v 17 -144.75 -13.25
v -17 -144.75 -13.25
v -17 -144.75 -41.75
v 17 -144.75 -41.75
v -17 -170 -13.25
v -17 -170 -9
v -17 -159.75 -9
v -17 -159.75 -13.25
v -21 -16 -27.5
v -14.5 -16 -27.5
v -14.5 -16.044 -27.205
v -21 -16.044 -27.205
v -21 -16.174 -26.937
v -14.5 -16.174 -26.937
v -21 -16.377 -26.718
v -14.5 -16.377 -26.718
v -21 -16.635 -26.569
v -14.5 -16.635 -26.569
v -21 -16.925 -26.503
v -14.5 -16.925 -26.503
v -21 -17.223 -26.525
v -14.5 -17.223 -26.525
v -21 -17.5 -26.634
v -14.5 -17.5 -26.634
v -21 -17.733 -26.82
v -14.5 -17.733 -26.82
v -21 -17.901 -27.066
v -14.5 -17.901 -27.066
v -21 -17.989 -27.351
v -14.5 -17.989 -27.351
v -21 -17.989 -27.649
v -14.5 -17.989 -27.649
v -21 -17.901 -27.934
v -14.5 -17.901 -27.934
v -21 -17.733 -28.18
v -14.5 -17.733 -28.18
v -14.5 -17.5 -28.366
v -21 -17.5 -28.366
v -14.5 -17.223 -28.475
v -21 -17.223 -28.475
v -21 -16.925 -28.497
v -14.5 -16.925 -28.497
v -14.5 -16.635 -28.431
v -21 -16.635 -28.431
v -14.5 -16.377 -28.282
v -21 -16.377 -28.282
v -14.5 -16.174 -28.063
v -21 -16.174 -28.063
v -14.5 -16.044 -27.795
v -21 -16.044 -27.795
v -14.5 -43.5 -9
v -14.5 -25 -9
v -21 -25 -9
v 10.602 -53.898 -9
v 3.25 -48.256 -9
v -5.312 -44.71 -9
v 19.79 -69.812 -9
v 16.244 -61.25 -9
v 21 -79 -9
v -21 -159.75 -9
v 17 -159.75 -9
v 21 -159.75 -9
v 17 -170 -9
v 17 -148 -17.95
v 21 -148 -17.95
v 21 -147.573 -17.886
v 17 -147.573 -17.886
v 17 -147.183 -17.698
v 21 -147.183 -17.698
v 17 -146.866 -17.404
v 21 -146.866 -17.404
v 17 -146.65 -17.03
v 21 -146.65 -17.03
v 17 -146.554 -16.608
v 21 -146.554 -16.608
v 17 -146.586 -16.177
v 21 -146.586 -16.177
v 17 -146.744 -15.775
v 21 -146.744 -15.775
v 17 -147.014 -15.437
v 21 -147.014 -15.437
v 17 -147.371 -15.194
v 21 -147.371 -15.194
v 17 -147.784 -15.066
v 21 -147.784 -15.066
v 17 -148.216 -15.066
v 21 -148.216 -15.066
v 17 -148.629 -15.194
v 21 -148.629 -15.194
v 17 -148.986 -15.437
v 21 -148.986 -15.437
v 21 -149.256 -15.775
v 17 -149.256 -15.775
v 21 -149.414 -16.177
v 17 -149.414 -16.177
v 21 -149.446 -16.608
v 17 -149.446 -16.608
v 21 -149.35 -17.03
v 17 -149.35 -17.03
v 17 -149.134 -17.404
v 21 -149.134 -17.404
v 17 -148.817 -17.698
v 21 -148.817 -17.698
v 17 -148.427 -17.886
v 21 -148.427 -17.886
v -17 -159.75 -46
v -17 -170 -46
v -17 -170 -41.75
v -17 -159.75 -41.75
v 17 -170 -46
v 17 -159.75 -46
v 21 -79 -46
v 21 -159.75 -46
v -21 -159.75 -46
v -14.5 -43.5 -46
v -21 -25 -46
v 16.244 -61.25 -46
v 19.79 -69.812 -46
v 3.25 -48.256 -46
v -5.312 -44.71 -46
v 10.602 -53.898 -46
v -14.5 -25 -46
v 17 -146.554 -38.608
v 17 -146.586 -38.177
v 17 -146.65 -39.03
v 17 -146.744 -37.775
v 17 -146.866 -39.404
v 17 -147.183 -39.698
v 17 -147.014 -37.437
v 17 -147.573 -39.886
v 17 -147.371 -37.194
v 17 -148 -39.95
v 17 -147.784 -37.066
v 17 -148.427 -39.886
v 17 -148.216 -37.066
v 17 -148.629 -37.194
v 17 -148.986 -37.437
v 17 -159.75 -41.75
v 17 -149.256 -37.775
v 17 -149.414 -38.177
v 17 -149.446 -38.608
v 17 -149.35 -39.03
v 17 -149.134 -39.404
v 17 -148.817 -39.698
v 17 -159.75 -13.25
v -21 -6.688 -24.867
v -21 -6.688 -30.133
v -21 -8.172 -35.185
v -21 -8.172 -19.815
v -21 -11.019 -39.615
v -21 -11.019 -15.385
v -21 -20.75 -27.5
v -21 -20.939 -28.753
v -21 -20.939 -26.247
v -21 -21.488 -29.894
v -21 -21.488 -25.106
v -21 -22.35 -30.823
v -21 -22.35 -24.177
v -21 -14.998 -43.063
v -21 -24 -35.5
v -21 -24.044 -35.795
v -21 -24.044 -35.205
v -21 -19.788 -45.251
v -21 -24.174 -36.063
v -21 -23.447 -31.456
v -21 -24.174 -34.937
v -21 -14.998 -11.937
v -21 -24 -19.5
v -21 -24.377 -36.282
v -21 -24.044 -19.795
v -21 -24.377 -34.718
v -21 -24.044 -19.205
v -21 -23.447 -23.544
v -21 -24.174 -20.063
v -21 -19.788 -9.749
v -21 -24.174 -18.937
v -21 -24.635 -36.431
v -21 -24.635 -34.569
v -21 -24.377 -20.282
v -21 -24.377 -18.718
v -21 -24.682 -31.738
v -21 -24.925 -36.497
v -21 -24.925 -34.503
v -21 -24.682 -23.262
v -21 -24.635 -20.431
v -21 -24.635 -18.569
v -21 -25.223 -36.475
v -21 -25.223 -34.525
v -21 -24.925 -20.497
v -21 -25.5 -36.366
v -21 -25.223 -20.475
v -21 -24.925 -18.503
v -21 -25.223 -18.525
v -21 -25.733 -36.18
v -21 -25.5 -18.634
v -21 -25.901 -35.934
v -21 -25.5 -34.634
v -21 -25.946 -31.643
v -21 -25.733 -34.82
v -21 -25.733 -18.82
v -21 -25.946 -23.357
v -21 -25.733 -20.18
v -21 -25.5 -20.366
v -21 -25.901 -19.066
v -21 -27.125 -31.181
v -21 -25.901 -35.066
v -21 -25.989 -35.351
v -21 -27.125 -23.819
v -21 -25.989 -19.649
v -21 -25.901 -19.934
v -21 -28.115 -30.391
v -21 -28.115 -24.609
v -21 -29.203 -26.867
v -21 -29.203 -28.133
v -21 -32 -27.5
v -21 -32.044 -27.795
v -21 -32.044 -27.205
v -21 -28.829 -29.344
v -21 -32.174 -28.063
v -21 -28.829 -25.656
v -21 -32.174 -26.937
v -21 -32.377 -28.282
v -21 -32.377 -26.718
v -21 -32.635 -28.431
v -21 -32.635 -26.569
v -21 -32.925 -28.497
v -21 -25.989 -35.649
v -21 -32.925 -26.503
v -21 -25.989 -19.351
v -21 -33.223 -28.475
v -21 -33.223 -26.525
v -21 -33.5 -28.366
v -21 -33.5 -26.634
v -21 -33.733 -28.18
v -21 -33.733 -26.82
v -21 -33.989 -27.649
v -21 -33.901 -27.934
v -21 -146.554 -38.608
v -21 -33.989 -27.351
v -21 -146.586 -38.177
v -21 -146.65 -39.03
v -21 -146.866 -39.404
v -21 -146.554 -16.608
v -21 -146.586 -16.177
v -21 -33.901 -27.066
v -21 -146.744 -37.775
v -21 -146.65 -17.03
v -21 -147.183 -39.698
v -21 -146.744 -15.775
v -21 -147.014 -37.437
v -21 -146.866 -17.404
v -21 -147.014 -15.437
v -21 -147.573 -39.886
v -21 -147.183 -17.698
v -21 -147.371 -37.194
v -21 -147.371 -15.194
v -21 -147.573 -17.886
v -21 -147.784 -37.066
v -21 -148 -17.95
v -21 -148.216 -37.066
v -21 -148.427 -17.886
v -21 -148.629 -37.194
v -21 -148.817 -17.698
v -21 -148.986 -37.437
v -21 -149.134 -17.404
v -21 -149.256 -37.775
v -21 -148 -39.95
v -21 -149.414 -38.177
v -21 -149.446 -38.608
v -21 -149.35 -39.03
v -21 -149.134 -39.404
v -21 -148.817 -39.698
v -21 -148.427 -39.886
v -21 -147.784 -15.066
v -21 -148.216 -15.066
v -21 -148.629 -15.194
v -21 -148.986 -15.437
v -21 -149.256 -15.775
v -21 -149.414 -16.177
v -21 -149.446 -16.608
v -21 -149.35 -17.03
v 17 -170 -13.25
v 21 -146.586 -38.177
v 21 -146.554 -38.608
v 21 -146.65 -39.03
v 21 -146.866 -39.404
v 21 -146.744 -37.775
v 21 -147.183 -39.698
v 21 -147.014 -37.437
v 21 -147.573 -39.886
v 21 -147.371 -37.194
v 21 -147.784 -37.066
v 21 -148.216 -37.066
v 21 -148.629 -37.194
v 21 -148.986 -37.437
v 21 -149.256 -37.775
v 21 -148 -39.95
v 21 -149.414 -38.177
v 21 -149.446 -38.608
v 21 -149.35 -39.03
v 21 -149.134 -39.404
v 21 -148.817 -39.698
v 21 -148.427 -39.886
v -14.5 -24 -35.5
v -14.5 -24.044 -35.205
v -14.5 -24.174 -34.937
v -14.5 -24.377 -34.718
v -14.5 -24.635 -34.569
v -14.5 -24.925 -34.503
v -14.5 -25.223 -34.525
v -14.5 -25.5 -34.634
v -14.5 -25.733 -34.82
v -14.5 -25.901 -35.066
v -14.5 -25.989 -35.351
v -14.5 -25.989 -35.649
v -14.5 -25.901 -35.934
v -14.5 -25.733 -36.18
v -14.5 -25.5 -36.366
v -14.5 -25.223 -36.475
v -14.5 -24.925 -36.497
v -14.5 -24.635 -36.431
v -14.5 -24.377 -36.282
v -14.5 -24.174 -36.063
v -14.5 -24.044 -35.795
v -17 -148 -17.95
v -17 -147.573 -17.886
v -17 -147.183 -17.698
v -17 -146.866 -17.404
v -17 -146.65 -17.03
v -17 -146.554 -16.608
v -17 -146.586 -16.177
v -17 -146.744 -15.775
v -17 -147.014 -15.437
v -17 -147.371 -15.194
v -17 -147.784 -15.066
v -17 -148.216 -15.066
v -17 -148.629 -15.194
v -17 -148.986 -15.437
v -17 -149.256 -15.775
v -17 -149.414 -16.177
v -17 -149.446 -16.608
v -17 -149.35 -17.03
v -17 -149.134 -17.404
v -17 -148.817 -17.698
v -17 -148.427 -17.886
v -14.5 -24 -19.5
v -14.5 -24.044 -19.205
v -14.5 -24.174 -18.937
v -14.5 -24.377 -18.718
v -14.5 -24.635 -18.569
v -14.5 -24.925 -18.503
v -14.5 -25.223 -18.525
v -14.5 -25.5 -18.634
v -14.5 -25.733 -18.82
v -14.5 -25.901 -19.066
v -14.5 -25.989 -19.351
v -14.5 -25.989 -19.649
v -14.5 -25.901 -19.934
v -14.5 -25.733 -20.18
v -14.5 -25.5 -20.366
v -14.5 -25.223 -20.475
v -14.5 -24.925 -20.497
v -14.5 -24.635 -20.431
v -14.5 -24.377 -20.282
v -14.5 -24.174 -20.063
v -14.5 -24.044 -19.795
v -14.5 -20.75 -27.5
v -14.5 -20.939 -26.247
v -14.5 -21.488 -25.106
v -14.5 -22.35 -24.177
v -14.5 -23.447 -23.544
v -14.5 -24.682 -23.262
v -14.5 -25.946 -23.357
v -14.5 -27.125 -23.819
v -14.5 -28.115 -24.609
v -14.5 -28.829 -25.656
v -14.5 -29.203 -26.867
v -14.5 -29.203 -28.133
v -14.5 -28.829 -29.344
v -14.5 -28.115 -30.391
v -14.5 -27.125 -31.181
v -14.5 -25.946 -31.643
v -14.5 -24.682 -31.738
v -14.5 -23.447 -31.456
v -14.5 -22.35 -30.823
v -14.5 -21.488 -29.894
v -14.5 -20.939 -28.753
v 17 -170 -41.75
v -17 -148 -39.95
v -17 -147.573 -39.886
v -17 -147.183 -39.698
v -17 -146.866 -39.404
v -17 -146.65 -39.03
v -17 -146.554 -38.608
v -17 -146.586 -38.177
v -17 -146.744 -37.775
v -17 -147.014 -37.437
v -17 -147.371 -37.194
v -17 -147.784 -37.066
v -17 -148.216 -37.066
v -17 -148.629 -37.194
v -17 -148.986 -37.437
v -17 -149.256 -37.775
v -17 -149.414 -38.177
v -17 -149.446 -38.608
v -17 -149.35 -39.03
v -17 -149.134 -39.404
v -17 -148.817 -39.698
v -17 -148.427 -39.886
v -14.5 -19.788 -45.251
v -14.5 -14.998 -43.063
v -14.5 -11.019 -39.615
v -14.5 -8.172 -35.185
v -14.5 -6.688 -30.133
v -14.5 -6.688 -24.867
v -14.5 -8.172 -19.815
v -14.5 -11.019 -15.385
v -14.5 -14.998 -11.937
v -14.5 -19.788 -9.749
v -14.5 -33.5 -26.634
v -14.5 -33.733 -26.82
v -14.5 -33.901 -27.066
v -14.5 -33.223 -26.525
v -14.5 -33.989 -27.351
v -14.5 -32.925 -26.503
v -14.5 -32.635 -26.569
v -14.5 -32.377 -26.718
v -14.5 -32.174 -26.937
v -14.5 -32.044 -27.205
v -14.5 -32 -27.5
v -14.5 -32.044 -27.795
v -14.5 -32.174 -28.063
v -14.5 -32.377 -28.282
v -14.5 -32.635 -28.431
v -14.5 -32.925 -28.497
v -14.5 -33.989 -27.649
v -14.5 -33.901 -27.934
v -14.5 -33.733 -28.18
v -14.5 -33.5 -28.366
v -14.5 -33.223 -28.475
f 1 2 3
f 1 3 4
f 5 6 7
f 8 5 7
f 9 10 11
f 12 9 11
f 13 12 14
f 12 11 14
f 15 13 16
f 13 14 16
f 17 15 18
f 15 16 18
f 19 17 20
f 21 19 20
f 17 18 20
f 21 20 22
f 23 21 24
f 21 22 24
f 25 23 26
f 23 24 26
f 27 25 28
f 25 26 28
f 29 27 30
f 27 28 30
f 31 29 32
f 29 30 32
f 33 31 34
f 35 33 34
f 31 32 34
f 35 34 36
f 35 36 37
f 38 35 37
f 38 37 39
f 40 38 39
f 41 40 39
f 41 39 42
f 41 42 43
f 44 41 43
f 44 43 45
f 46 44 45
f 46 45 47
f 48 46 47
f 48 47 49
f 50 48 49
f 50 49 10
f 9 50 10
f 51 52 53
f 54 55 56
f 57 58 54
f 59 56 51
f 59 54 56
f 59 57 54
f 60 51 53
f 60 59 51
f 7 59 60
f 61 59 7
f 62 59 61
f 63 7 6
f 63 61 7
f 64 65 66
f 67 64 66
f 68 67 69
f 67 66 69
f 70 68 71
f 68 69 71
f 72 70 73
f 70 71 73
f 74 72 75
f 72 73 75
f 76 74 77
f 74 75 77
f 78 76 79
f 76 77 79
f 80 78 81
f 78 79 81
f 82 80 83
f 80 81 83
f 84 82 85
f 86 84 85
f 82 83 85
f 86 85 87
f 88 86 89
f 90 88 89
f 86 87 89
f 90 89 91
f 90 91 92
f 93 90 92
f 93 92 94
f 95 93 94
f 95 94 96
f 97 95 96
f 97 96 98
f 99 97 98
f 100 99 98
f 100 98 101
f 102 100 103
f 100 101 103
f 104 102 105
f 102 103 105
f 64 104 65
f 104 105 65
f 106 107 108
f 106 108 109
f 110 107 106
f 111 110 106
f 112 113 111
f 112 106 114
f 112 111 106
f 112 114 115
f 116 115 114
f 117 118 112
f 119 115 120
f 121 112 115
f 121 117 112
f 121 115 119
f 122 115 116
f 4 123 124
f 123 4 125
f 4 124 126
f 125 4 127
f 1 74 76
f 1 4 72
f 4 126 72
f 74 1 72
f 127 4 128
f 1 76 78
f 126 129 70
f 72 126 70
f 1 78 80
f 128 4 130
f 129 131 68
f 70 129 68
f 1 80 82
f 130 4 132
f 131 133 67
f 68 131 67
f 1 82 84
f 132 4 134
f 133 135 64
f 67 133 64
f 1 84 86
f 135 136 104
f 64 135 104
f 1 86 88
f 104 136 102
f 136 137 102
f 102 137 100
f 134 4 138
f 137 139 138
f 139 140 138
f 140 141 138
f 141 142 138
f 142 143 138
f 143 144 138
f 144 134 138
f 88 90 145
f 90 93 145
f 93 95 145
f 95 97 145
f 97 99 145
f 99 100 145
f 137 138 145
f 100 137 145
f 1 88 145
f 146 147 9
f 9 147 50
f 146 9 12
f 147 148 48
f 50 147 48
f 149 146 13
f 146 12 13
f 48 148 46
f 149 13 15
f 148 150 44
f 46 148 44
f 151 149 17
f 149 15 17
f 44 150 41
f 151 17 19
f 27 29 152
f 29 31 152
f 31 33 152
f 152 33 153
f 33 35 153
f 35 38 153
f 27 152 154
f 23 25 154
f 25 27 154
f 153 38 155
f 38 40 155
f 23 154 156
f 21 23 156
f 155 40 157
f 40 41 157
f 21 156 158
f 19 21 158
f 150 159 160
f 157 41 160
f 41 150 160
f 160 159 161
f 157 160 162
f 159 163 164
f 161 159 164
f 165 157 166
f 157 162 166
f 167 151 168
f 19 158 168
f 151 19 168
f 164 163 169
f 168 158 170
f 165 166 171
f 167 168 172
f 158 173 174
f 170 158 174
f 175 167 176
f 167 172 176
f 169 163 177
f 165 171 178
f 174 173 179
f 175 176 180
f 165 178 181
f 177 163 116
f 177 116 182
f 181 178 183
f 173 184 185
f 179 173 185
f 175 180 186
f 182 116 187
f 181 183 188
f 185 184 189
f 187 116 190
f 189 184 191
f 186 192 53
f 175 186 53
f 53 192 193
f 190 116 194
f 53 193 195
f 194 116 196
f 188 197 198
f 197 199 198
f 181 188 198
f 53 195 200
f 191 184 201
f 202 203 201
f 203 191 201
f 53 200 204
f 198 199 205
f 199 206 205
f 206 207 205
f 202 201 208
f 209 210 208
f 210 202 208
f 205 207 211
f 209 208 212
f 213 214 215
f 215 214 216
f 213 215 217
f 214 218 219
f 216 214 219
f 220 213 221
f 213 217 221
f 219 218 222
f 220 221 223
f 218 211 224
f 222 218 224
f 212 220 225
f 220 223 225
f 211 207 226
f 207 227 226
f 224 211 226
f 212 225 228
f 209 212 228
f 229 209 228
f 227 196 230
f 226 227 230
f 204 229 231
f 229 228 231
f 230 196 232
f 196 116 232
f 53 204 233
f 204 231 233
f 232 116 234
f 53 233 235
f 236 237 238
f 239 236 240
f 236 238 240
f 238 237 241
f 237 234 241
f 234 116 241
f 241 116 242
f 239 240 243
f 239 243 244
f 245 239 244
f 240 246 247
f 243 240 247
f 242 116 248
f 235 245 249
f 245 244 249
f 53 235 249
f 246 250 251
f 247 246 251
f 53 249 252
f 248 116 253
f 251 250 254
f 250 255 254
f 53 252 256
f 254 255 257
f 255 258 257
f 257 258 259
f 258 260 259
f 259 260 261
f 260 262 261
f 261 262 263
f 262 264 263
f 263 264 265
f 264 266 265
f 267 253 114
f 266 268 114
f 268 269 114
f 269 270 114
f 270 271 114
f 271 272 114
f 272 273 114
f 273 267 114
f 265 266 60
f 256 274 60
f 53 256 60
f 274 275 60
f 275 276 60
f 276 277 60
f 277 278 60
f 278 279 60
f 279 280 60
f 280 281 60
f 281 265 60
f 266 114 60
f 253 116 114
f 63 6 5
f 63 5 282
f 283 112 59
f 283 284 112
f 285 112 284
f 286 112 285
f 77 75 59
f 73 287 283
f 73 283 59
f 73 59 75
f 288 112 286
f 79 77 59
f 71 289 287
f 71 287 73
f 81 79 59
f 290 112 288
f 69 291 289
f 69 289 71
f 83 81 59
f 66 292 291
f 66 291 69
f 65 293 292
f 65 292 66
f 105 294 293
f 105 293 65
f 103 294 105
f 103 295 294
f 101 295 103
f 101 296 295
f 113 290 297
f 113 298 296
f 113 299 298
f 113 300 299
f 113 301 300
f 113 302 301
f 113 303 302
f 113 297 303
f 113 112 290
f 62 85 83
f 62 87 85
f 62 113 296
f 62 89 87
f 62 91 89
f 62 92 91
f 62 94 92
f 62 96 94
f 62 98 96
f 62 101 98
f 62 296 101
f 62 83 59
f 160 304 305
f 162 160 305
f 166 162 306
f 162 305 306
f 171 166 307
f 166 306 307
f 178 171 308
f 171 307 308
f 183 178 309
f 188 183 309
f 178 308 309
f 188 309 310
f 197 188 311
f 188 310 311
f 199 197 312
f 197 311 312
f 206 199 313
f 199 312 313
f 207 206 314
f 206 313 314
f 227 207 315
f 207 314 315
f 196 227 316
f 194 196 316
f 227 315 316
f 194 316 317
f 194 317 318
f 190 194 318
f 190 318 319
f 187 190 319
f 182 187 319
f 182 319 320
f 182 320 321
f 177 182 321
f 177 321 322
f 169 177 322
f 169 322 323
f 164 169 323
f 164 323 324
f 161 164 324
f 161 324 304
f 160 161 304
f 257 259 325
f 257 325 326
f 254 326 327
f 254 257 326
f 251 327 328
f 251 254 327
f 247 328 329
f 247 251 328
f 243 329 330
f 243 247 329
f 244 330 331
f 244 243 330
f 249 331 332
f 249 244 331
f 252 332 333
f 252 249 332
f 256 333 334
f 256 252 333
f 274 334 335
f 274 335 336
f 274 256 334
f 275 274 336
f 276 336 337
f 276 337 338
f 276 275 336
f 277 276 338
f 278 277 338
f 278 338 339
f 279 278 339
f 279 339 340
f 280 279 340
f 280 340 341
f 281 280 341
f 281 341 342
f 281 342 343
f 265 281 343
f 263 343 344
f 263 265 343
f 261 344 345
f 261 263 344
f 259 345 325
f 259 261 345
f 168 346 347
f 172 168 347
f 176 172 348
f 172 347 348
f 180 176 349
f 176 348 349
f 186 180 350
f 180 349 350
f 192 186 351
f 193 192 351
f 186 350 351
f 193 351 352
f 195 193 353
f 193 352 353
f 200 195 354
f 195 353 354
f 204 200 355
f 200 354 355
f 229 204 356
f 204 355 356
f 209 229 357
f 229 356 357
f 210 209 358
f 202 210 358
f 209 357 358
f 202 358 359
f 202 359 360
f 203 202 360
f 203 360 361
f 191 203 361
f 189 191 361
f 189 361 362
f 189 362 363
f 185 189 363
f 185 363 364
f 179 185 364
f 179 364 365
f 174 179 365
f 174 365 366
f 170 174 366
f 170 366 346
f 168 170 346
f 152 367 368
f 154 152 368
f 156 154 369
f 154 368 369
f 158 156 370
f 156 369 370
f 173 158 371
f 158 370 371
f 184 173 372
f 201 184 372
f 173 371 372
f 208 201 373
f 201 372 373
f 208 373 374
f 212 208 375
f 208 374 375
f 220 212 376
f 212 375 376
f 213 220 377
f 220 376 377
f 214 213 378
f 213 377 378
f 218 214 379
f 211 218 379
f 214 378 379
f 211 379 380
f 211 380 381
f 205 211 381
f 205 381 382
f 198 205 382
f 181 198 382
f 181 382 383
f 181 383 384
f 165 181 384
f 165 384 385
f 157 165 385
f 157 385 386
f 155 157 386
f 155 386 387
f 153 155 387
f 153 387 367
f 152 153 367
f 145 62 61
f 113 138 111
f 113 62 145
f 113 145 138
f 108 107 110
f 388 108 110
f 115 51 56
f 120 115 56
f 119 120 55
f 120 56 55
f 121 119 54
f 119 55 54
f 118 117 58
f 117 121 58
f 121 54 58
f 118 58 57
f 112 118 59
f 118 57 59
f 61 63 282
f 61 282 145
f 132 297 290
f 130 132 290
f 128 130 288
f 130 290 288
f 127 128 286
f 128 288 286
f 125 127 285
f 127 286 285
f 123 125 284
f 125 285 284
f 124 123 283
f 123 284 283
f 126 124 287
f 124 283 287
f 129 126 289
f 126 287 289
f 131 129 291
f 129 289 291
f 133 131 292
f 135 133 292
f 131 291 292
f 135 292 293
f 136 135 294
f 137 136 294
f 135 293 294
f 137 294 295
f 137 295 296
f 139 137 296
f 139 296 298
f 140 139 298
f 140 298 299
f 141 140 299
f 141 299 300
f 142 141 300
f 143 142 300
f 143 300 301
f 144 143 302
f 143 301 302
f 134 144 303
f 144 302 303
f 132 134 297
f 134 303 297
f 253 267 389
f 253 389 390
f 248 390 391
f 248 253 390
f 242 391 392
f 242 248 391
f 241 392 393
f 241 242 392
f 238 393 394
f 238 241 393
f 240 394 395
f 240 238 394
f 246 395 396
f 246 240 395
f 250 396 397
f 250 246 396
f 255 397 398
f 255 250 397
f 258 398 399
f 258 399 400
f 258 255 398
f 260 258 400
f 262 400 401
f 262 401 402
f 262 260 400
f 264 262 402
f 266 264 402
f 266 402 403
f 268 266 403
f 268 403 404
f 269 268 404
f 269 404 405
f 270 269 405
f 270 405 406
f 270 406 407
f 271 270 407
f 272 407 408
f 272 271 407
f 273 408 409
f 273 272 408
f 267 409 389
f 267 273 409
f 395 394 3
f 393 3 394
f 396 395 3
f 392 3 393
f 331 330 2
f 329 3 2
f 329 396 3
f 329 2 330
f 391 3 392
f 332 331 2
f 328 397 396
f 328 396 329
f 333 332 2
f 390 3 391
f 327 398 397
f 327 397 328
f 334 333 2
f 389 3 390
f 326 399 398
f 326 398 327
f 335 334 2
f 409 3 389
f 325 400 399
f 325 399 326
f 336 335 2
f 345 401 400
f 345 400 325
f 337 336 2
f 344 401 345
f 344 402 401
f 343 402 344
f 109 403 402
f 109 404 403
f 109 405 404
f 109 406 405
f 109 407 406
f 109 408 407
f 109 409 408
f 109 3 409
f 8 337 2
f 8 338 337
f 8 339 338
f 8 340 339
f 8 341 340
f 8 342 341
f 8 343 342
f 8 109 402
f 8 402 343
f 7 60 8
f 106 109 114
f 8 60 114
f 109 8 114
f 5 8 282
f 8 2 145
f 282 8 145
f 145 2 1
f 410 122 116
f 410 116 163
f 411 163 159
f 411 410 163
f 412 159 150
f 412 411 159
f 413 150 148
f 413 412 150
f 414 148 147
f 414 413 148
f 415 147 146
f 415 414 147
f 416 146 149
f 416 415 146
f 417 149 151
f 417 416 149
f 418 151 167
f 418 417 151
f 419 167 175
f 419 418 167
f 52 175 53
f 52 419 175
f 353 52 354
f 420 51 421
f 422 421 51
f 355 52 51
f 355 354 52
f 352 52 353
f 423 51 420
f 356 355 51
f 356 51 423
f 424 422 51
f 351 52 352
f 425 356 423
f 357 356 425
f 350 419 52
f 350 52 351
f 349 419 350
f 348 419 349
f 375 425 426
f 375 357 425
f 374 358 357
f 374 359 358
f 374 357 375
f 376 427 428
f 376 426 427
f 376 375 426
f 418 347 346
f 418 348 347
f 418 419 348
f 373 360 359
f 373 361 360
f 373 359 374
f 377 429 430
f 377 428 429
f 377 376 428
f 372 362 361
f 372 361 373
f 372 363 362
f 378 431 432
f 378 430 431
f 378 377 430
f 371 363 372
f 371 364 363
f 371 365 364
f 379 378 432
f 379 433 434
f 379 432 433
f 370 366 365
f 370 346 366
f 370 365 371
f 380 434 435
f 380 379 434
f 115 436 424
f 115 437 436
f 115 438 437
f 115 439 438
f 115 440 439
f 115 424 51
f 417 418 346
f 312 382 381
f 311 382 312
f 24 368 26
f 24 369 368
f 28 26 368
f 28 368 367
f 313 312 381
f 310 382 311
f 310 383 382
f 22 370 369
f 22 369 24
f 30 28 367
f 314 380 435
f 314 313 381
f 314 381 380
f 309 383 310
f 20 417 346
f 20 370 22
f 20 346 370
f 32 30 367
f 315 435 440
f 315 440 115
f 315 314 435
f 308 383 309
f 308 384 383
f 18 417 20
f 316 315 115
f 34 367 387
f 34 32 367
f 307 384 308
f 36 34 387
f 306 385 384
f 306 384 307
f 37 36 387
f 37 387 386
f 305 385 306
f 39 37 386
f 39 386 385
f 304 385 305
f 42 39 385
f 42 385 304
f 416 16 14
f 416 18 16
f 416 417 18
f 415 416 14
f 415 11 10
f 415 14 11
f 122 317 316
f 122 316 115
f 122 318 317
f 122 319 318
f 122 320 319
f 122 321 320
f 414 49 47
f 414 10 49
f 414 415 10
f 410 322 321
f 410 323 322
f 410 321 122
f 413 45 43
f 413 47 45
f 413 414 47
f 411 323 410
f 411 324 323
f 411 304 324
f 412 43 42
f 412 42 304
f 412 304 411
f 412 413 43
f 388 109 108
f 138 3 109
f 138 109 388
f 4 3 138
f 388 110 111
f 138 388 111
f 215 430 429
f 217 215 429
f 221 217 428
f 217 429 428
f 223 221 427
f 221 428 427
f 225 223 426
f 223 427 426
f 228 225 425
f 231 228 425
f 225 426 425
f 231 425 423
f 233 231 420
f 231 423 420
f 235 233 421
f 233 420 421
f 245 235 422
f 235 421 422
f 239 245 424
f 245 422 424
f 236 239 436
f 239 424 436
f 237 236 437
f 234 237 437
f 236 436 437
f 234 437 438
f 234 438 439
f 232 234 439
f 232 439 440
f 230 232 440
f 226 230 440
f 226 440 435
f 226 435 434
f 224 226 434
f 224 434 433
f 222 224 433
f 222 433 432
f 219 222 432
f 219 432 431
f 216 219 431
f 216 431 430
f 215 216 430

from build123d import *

# Parameters (mm, degrees)
SKETCH1_W               = 50
SKETCH1_H               = 150
BOSS_EXTRUDE1_DEPTH     = 55
CUT_EXTRUDE1_DEPTH      = 168.406690428
CUT_EXTRUDE1_DEPTH_BACK = 45
SKETCH2_R               = 10.25
SKETCH7_R               = 1
SKETCH7_R_2             = 4.25
CUT_EXTRUDE3_DEPTH      = 10
SKETCH8_W               = 55
SKETCH8_H               = 55
SKETCH8_R               = 10.25
BOSS_EXTRUDE2_DEPTH     = 50
SKETCH10_W              = 8
SKETCH10_H              = 10.25
SKETCH10_W_2            = 17
SKETCH10_H_2            = 1
SKETCH10_W_3            = 34
SKETCH10_H_3            = 20
SKETCH10_H_4            = 5
CUT_EXTRUDE4_DEPTH      = 214.717102732
SKETCH11_W              = 34
SKETCH11_H              = 13.25
BOSS_EXTRUDE4_DEPTH     = 25
SKETCH13_W              = 55
SKETCH13_H              = 10
CUT_EXTRUDE5_DEPTH      = 8
SKETCH14_R              = 5.030159043
CUT_EXTRUDE6_DEPTH      = 8
SKETCH15_W              = 34
SKETCH15_H              = 0.25
BOSS_EXTRUDE5_DEPTH     = 13.25
CUT_EXTRUDE7_DEPTH      = 181.416185527
BOSS_EXTRUDE6_START     = 1.5
SKETCH19_R              = 10.25
SKETCH19_R_2            = 1
SKETCH19_R_3            = 4.25
BOSS_EXTRUDE6_DEPTH     = 1.5
CUT_EXTRUDE8_DEPTH      = 184.89467094
SKETCH21_R              = 5.030159043
SKETCH21_R_2            = 4.5
BOSS_EXTRUDE7_DEPTH     = 8
SKETCH24_W              = 4
SKETCH24_H              = 30
CUT_EXTRUDE10_DEPTH     = 181.416185527
SKETCH25_W              = 55
SKETCH25_H              = 86.25
CUT_EXTRUDE11_DEPTH     = 4
BOSS_EXTRUDE8_START     = 4
SKETCH26_R              = 1
SKETCH26_R_2            = 4.25
BOSS_EXTRUDE8_DEPTH     = 4
SKETCH27_W              = 4
SKETCH27_H              = 123.25
CUT_EXTRUDE12_DEPTH     = 181.416185527
CUT_EXTRUDE13_DEPTH     = 180.905530765
SKETCH29_W              = 42
SKETCH29_H              = 9
CUT_EXTRUDE15_DEPTH     = 174.776436838
SKETCH30_R              = 4.5
SKETCH30_R_2            = 1.45
BOSS_EXTRUDE9_DEPTH     = 4


with BuildPart() as part:
    # Sketch1 → Boss-Extrude1 (new body)
    with BuildSketch(Plane.XY):
        with Locations((0, -75)):
            Rectangle(SKETCH1_W, SKETCH1_H)
    extrude(amount=-BOSS_EXTRUDE1_DEPTH)

    # Sketch2 → Cut-Extrude1 (cut, two sides: drawn at the far end of the back side and taken through both)
    with BuildSketch(Plane(origin=(25, 0, 0), x_dir=(0, 0, -1), z_dir=(1, 0, 0)).offset(-CUT_EXTRUDE1_DEPTH_BACK)):
        with Locations(Location((27.5, -25, 0), (0, 0, 270))):
            Circle(SKETCH2_R)
    extrude(amount=CUT_EXTRUDE1_DEPTH + CUT_EXTRUDE1_DEPTH_BACK, mode=Mode.SUBTRACT)

    # Sketch7 → Cut-Extrude3 (cut)
    with BuildSketch(Plane(origin=(-20, 0, 0), x_dir=(0, 0, -1), z_dir=(1, 0, 0))):
        with Locations(Location((27.5, -17, 0), (0, 0, 90))):
            Circle(SKETCH7_R)
        with Locations(Location((35.5, -25, 0), (0, 0, 90))):
            Circle(SKETCH7_R)
        with Locations(Location((27.5, -33, 0), (0, 0, 90))):
            Circle(SKETCH7_R)
        with Locations(Location((19.5, -25, 0), (0, 0, 90))):
            Circle(SKETCH7_R)
        with Locations(Location((27.5, -25, 0), (0, 0, 90))):
            Circle(SKETCH7_R_2)
    extrude(amount=-CUT_EXTRUDE3_DEPTH, mode=Mode.SUBTRACT)

    # Sketch8 → Boss-Extrude2 (add)
    with BuildSketch(Plane(origin=(25, 0, 0), x_dir=(0, 0, -1), z_dir=(1, 0, 0))):
        with Locations((27.5, -177.5)):
            Rectangle(SKETCH8_W, SKETCH8_H)
        with Locations(Location((27.5, -180, 0), (0, 0, 90))):
            Circle(SKETCH8_R, mode=Mode.SUBTRACT)
    extrude(amount=-BOSS_EXTRUDE2_DEPTH)

    # Sketch10 → Cut-Extrude4 (cut, through all)
    with BuildSketch(Plane.XY):
        Polygon((-17, -205), (17, -205), (17, -191.25), (0, -191.25), (-17, -191.25), align=None)
        Polygon((-25, -205), (-17, -205), (-17, -191.25), (-17, -190.25), (-25, -190.25), align=None)
        Polygon((17, -191.25), (17, -205), (25, -205), (25, -190.25), (17, -190.25), align=None)
        with Locations((-21, -185.125)):
            Rectangle(SKETCH10_W, SKETCH10_H)
        with Locations((-21, -174.875)):
            Rectangle(SKETCH10_W, SKETCH10_H)
        with Locations((21, -174.875)):
            Rectangle(SKETCH10_W, SKETCH10_H)
        with Locations((21, -185.125)):
            Rectangle(SKETCH10_W, SKETCH10_H)
        with Locations((-8.5, -185.125)):
            Rectangle(SKETCH10_W_2, SKETCH10_H)
        with Locations((8.5, -185.125)):
            Rectangle(SKETCH10_W_2, SKETCH10_H)
        Polygon((0, -180), (17, -180), (17, -169.75), (-17, -169.75), (-17, -180), align=None)
        with Locations((-8.5, -190.75)):
            Rectangle(SKETCH10_W_2, SKETCH10_H_2)
        with Locations((8.5, -190.75)):
            Rectangle(SKETCH10_W_2, SKETCH10_H_2)
        with Locations((0, -154.75)):
            Rectangle(SKETCH10_W_3, SKETCH10_H_3)
        with Locations((0, -167.25)):
            Rectangle(SKETCH10_W_3, SKETCH10_H_4)
    extrude(amount=-CUT_EXTRUDE4_DEPTH, mode=Mode.SUBTRACT)

    # Sketch11 → Boss-Extrude4 (add)
    with BuildSketch(Plane.XZ.offset(144.75)):
        with Locations((0, -6.625)):
            Rectangle(SKETCH11_W, SKETCH11_H)
        with Locations((0, -48.375)):
            Rectangle(SKETCH11_W, SKETCH11_H)
    extrude(amount=BOSS_EXTRUDE4_DEPTH)

    # Sketch13 → Cut-Extrude5 (cut)
    with BuildSketch(Plane(origin=(25, 0, 0), x_dir=(0, 0, -1), z_dir=(1, 0, 0))):
        with Locations((27.5, -164.75)):
            Rectangle(SKETCH13_W, SKETCH13_H)
    cut_extrude5 = extrude(amount=-CUT_EXTRUDE5_DEPTH, mode=Mode.SUBTRACT)

    # Mirror2: Cut-Extrude5 across plane
    add(cut_extrude5.mirror(Plane(origin=(0, 0, 0), x_dir=(0, 0, 1), z_dir=(1, 0, 0))), mode=Mode.SUBTRACT)

    # Sketch14 → Cut-Extrude6 (cut)
    with BuildSketch(Plane(origin=(25, 0, 0), x_dir=(0, 0, -1), z_dir=(1, 0, 0))):
        with Locations(Location((16.5, -148, 0), (0, 0, 90))):
            Circle(SKETCH14_R)
        with Locations(Location((38.5, -148, 0), (0, 0, 90))):
            Circle(SKETCH14_R)
    cut_extrude6 = extrude(amount=-CUT_EXTRUDE6_DEPTH, mode=Mode.SUBTRACT)

    # Mirror3: Cut-Extrude6 across plane
    add(cut_extrude6.mirror(Plane(origin=(0, 0, 0), x_dir=(0, 0, 1), z_dir=(1, 0, 0))), mode=Mode.SUBTRACT)

    # Sketch15 → Boss-Extrude5 (add)
    with BuildSketch(Plane.XY):
        with Locations((0, -169.875)):
            Rectangle(SKETCH15_W, SKETCH15_H)
    boss_extrude5 = extrude(amount=-BOSS_EXTRUDE5_DEPTH)

    # Mirror4: Boss-Extrude5 across plane
    add(boss_extrude5.mirror(Plane.XY.offset(-27.5)))

    # Sketch16 → Cut-Extrude7 (cut, through all)
    with BuildSketch(Plane.XY):
        Polygon((-18.5, 0), (-18.5, -14.75), (-18.5, -35.25), (-18.5, -43.5), (25, -43.5), (25, 0), align=None)
    extrude(amount=-CUT_EXTRUDE7_DEPTH, mode=Mode.SUBTRACT)

    # Sketch19 → Boss-Extrude6 (add)
    with BuildSketch(Plane(origin=(-20, 0, 0), x_dir=(0, 0, -1), z_dir=(1, 0, 0)).offset(BOSS_EXTRUDE6_START)):
        with Locations((27.5, -25)):
            Circle(SKETCH19_R)
        with Locations(Location((27.5, -17, 0), (0, 0, 90))):
            Circle(SKETCH19_R_2, mode=Mode.SUBTRACT)
        with Locations(Location((27.5, -33, 0), (0, 0, 90))):
            Circle(SKETCH19_R_2, mode=Mode.SUBTRACT)
        with Locations(Location((19.5, -25, 0), (0, 0, 90))):
            Circle(SKETCH19_R_2, mode=Mode.SUBTRACT)
        with Locations(Location((35.5, -25, 0), (0, 0, 90))):
            Circle(SKETCH19_R_2, mode=Mode.SUBTRACT)
        with Locations(Location((27.5, -25, 0), (0, 0, 90))):
            Circle(SKETCH19_R_3, mode=Mode.SUBTRACT)
    extrude(amount=-BOSS_EXTRUDE6_DEPTH)

    # Sketch20 → Cut-Extrude8 (cut, through all)
    with BuildSketch(Plane(origin=(-18.5, 0, 0), x_dir=(0, 0, -1), z_dir=(1, 0, 0))):
        with BuildLine():
            Line((0, 0), (0, -43.5))
            Line((0, -43.5), (9, -43.5))
            Line((9, -43.5), (9, -25))
            ThreePointArc((9, -25), (27.5, -6.5), (46, -25))
            Line((46, -25), (46, -43.5))
            Line((46, -43.5), (55, -43.5))
            Line((55, -43.5), (55, 0))
            Line((55, 0), (0, 0))
        make_face()
    extrude(amount=-CUT_EXTRUDE8_DEPTH, mode=Mode.SUBTRACT)

    # Sketch21 → Boss-Extrude7 (add)
    # profile 1 of 2: a face of its own
    with BuildSketch(Plane(origin=(25, 0, 0), x_dir=(0, 0, -1), z_dir=(1, 0, 0))):
        with Locations(Location((16.5, -148, 0), (0, 0, 229.751587581))):
            Circle(SKETCH21_R)
        with Locations(Location((16.5, -148, 0), (0, 0, 90))):
            Circle(SKETCH21_R_2, mode=Mode.SUBTRACT)
    # profile 2 of 2: a face of its own
    with BuildSketch(Plane(origin=(25, 0, 0), x_dir=(0, 0, -1), z_dir=(1, 0, 0))):
        with Locations(Location((38.5, -148, 0), (0, 0, 310.248412419))):
            Circle(SKETCH21_R)
        with Locations(Location((38.5, -148, 0), (0, 0, 90))):
            Circle(SKETCH21_R_2, mode=Mode.SUBTRACT)
    boss_extrude7 = extrude(amount=-BOSS_EXTRUDE7_DEPTH)

    # Mirror5: Boss-Extrude7 across plane
    add(boss_extrude7.mirror(Plane(origin=(0, 0, 0), x_dir=(0, 0, 1), z_dir=(1, 0, 0))))

    # Sketch24 → Cut-Extrude10 (cut, through all)
    with BuildSketch(Plane.XY):
        with Locations((-23, -144.75)):
            Rectangle(SKETCH24_W, SKETCH24_H)
        with Locations((23, -144.75)):
            Rectangle(SKETCH24_W, SKETCH24_H)
    extrude(amount=-CUT_EXTRUDE10_DEPTH, mode=Mode.SUBTRACT)

    # Sketch25 → Cut-Extrude11 (cut)
    with BuildSketch(Plane(origin=(25, 0, 0), x_dir=(0, 0, -1), z_dir=(1, 0, 0))):
        with Locations((27.5, -86.625)):
            Rectangle(SKETCH25_W, SKETCH25_H)
    extrude(amount=-CUT_EXTRUDE11_DEPTH, mode=Mode.SUBTRACT)

    # Sketch26 → Boss-Extrude8 (add)
    with BuildSketch(Plane(origin=(-18.5, 0, 0), x_dir=(0, 0, -1), z_dir=(1, 0, 0)).offset(BOSS_EXTRUDE8_START)):
        with BuildLine():
            Line((46, -43.5), (46, -25))
            ThreePointArc((46, -25), (27.5, -6.5), (9, -25))
            Line((9, -25), (9, -43.5))
            Line((9, -43.5), (46, -43.5))
        make_face()
        with Locations(Location((35.5, -25, 0), (0, 0, 90))):
            Circle(SKETCH26_R, mode=Mode.SUBTRACT)
        with Locations(Location((27.5, -25, 0), (0, 0, 90))):
            Circle(SKETCH26_R_2, mode=Mode.SUBTRACT)
        with Locations(Location((19.5, -25, 0), (0, 0, 90))):
            Circle(SKETCH26_R, mode=Mode.SUBTRACT)
        with Locations(Location((27.5, -33, 0), (0, 0, 90))):
            Circle(SKETCH26_R, mode=Mode.SUBTRACT)
        with Locations(Location((27.5, -17, 0), (0, 0, 90))):
            Circle(SKETCH26_R, mode=Mode.SUBTRACT)
    extrude(amount=-BOSS_EXTRUDE8_DEPTH)

    # Sketch27 → Cut-Extrude12 (cut, through all)
    with BuildSketch(Plane.XY):
        with Locations((-23, -68.125)):
            Rectangle(SKETCH27_W, SKETCH27_H)
    extrude(amount=-CUT_EXTRUDE12_DEPTH, mode=Mode.SUBTRACT)

    # Sketch28 → Cut-Extrude13 (cut, through all)
    with BuildSketch(Plane.XY):
        with BuildLine():
            Line((21, -43.5), (-14.5, -43.5))
            ThreePointArc((-14.5, -43.5), (10.602290732, -53.897709268), (21, -79))
            Line((21, -79), (21, -43.5))
        make_face()
    extrude(amount=-CUT_EXTRUDE13_DEPTH, mode=Mode.SUBTRACT)

    # Sketch29 → Cut-Extrude15 (cut, through all)
    with BuildSketch(Plane.XZ.offset(170)):
        with Locations((0, -50.5)):
            Rectangle(SKETCH29_W, SKETCH29_H)
        with Locations((0, -4.5)):
            Rectangle(SKETCH29_W, SKETCH29_H)
    extrude(amount=-CUT_EXTRUDE15_DEPTH, mode=Mode.SUBTRACT)

    # Sketch30 → Boss-Extrude9 (add)
    # profile 1 of 2: a face of its own
    with BuildSketch(Plane(origin=(21, 0, 0), x_dir=(0, 0, -1), z_dir=(1, 0, 0))):
        with Locations(Location((16.5, -148, 0), (0, 0, 223.761742693))):
            Circle(SKETCH30_R)
        with Locations((16.5, -148)):
            Circle(SKETCH30_R_2, mode=Mode.SUBTRACT)
    # profile 2 of 2: a face of its own
    with BuildSketch(Plane(origin=(21, 0, 0), x_dir=(0, 0, -1), z_dir=(1, 0, 0))):
        with Locations(Location((38.5, -148, 0), (0, 0, 316.238257307))):
            Circle(SKETCH30_R)
        with Locations((38.5, -148)):
            Circle(SKETCH30_R_2, mode=Mode.SUBTRACT)
    boss_extrude9 = extrude(amount=-BOSS_EXTRUDE9_DEPTH)

    # Mirror6: Boss-Extrude9 across plane
    add(boss_extrude9.mirror(Plane(origin=(0, 0, 0), x_dir=(0, 0, 1), z_dir=(1, 0, 0))))


solid = part.part
